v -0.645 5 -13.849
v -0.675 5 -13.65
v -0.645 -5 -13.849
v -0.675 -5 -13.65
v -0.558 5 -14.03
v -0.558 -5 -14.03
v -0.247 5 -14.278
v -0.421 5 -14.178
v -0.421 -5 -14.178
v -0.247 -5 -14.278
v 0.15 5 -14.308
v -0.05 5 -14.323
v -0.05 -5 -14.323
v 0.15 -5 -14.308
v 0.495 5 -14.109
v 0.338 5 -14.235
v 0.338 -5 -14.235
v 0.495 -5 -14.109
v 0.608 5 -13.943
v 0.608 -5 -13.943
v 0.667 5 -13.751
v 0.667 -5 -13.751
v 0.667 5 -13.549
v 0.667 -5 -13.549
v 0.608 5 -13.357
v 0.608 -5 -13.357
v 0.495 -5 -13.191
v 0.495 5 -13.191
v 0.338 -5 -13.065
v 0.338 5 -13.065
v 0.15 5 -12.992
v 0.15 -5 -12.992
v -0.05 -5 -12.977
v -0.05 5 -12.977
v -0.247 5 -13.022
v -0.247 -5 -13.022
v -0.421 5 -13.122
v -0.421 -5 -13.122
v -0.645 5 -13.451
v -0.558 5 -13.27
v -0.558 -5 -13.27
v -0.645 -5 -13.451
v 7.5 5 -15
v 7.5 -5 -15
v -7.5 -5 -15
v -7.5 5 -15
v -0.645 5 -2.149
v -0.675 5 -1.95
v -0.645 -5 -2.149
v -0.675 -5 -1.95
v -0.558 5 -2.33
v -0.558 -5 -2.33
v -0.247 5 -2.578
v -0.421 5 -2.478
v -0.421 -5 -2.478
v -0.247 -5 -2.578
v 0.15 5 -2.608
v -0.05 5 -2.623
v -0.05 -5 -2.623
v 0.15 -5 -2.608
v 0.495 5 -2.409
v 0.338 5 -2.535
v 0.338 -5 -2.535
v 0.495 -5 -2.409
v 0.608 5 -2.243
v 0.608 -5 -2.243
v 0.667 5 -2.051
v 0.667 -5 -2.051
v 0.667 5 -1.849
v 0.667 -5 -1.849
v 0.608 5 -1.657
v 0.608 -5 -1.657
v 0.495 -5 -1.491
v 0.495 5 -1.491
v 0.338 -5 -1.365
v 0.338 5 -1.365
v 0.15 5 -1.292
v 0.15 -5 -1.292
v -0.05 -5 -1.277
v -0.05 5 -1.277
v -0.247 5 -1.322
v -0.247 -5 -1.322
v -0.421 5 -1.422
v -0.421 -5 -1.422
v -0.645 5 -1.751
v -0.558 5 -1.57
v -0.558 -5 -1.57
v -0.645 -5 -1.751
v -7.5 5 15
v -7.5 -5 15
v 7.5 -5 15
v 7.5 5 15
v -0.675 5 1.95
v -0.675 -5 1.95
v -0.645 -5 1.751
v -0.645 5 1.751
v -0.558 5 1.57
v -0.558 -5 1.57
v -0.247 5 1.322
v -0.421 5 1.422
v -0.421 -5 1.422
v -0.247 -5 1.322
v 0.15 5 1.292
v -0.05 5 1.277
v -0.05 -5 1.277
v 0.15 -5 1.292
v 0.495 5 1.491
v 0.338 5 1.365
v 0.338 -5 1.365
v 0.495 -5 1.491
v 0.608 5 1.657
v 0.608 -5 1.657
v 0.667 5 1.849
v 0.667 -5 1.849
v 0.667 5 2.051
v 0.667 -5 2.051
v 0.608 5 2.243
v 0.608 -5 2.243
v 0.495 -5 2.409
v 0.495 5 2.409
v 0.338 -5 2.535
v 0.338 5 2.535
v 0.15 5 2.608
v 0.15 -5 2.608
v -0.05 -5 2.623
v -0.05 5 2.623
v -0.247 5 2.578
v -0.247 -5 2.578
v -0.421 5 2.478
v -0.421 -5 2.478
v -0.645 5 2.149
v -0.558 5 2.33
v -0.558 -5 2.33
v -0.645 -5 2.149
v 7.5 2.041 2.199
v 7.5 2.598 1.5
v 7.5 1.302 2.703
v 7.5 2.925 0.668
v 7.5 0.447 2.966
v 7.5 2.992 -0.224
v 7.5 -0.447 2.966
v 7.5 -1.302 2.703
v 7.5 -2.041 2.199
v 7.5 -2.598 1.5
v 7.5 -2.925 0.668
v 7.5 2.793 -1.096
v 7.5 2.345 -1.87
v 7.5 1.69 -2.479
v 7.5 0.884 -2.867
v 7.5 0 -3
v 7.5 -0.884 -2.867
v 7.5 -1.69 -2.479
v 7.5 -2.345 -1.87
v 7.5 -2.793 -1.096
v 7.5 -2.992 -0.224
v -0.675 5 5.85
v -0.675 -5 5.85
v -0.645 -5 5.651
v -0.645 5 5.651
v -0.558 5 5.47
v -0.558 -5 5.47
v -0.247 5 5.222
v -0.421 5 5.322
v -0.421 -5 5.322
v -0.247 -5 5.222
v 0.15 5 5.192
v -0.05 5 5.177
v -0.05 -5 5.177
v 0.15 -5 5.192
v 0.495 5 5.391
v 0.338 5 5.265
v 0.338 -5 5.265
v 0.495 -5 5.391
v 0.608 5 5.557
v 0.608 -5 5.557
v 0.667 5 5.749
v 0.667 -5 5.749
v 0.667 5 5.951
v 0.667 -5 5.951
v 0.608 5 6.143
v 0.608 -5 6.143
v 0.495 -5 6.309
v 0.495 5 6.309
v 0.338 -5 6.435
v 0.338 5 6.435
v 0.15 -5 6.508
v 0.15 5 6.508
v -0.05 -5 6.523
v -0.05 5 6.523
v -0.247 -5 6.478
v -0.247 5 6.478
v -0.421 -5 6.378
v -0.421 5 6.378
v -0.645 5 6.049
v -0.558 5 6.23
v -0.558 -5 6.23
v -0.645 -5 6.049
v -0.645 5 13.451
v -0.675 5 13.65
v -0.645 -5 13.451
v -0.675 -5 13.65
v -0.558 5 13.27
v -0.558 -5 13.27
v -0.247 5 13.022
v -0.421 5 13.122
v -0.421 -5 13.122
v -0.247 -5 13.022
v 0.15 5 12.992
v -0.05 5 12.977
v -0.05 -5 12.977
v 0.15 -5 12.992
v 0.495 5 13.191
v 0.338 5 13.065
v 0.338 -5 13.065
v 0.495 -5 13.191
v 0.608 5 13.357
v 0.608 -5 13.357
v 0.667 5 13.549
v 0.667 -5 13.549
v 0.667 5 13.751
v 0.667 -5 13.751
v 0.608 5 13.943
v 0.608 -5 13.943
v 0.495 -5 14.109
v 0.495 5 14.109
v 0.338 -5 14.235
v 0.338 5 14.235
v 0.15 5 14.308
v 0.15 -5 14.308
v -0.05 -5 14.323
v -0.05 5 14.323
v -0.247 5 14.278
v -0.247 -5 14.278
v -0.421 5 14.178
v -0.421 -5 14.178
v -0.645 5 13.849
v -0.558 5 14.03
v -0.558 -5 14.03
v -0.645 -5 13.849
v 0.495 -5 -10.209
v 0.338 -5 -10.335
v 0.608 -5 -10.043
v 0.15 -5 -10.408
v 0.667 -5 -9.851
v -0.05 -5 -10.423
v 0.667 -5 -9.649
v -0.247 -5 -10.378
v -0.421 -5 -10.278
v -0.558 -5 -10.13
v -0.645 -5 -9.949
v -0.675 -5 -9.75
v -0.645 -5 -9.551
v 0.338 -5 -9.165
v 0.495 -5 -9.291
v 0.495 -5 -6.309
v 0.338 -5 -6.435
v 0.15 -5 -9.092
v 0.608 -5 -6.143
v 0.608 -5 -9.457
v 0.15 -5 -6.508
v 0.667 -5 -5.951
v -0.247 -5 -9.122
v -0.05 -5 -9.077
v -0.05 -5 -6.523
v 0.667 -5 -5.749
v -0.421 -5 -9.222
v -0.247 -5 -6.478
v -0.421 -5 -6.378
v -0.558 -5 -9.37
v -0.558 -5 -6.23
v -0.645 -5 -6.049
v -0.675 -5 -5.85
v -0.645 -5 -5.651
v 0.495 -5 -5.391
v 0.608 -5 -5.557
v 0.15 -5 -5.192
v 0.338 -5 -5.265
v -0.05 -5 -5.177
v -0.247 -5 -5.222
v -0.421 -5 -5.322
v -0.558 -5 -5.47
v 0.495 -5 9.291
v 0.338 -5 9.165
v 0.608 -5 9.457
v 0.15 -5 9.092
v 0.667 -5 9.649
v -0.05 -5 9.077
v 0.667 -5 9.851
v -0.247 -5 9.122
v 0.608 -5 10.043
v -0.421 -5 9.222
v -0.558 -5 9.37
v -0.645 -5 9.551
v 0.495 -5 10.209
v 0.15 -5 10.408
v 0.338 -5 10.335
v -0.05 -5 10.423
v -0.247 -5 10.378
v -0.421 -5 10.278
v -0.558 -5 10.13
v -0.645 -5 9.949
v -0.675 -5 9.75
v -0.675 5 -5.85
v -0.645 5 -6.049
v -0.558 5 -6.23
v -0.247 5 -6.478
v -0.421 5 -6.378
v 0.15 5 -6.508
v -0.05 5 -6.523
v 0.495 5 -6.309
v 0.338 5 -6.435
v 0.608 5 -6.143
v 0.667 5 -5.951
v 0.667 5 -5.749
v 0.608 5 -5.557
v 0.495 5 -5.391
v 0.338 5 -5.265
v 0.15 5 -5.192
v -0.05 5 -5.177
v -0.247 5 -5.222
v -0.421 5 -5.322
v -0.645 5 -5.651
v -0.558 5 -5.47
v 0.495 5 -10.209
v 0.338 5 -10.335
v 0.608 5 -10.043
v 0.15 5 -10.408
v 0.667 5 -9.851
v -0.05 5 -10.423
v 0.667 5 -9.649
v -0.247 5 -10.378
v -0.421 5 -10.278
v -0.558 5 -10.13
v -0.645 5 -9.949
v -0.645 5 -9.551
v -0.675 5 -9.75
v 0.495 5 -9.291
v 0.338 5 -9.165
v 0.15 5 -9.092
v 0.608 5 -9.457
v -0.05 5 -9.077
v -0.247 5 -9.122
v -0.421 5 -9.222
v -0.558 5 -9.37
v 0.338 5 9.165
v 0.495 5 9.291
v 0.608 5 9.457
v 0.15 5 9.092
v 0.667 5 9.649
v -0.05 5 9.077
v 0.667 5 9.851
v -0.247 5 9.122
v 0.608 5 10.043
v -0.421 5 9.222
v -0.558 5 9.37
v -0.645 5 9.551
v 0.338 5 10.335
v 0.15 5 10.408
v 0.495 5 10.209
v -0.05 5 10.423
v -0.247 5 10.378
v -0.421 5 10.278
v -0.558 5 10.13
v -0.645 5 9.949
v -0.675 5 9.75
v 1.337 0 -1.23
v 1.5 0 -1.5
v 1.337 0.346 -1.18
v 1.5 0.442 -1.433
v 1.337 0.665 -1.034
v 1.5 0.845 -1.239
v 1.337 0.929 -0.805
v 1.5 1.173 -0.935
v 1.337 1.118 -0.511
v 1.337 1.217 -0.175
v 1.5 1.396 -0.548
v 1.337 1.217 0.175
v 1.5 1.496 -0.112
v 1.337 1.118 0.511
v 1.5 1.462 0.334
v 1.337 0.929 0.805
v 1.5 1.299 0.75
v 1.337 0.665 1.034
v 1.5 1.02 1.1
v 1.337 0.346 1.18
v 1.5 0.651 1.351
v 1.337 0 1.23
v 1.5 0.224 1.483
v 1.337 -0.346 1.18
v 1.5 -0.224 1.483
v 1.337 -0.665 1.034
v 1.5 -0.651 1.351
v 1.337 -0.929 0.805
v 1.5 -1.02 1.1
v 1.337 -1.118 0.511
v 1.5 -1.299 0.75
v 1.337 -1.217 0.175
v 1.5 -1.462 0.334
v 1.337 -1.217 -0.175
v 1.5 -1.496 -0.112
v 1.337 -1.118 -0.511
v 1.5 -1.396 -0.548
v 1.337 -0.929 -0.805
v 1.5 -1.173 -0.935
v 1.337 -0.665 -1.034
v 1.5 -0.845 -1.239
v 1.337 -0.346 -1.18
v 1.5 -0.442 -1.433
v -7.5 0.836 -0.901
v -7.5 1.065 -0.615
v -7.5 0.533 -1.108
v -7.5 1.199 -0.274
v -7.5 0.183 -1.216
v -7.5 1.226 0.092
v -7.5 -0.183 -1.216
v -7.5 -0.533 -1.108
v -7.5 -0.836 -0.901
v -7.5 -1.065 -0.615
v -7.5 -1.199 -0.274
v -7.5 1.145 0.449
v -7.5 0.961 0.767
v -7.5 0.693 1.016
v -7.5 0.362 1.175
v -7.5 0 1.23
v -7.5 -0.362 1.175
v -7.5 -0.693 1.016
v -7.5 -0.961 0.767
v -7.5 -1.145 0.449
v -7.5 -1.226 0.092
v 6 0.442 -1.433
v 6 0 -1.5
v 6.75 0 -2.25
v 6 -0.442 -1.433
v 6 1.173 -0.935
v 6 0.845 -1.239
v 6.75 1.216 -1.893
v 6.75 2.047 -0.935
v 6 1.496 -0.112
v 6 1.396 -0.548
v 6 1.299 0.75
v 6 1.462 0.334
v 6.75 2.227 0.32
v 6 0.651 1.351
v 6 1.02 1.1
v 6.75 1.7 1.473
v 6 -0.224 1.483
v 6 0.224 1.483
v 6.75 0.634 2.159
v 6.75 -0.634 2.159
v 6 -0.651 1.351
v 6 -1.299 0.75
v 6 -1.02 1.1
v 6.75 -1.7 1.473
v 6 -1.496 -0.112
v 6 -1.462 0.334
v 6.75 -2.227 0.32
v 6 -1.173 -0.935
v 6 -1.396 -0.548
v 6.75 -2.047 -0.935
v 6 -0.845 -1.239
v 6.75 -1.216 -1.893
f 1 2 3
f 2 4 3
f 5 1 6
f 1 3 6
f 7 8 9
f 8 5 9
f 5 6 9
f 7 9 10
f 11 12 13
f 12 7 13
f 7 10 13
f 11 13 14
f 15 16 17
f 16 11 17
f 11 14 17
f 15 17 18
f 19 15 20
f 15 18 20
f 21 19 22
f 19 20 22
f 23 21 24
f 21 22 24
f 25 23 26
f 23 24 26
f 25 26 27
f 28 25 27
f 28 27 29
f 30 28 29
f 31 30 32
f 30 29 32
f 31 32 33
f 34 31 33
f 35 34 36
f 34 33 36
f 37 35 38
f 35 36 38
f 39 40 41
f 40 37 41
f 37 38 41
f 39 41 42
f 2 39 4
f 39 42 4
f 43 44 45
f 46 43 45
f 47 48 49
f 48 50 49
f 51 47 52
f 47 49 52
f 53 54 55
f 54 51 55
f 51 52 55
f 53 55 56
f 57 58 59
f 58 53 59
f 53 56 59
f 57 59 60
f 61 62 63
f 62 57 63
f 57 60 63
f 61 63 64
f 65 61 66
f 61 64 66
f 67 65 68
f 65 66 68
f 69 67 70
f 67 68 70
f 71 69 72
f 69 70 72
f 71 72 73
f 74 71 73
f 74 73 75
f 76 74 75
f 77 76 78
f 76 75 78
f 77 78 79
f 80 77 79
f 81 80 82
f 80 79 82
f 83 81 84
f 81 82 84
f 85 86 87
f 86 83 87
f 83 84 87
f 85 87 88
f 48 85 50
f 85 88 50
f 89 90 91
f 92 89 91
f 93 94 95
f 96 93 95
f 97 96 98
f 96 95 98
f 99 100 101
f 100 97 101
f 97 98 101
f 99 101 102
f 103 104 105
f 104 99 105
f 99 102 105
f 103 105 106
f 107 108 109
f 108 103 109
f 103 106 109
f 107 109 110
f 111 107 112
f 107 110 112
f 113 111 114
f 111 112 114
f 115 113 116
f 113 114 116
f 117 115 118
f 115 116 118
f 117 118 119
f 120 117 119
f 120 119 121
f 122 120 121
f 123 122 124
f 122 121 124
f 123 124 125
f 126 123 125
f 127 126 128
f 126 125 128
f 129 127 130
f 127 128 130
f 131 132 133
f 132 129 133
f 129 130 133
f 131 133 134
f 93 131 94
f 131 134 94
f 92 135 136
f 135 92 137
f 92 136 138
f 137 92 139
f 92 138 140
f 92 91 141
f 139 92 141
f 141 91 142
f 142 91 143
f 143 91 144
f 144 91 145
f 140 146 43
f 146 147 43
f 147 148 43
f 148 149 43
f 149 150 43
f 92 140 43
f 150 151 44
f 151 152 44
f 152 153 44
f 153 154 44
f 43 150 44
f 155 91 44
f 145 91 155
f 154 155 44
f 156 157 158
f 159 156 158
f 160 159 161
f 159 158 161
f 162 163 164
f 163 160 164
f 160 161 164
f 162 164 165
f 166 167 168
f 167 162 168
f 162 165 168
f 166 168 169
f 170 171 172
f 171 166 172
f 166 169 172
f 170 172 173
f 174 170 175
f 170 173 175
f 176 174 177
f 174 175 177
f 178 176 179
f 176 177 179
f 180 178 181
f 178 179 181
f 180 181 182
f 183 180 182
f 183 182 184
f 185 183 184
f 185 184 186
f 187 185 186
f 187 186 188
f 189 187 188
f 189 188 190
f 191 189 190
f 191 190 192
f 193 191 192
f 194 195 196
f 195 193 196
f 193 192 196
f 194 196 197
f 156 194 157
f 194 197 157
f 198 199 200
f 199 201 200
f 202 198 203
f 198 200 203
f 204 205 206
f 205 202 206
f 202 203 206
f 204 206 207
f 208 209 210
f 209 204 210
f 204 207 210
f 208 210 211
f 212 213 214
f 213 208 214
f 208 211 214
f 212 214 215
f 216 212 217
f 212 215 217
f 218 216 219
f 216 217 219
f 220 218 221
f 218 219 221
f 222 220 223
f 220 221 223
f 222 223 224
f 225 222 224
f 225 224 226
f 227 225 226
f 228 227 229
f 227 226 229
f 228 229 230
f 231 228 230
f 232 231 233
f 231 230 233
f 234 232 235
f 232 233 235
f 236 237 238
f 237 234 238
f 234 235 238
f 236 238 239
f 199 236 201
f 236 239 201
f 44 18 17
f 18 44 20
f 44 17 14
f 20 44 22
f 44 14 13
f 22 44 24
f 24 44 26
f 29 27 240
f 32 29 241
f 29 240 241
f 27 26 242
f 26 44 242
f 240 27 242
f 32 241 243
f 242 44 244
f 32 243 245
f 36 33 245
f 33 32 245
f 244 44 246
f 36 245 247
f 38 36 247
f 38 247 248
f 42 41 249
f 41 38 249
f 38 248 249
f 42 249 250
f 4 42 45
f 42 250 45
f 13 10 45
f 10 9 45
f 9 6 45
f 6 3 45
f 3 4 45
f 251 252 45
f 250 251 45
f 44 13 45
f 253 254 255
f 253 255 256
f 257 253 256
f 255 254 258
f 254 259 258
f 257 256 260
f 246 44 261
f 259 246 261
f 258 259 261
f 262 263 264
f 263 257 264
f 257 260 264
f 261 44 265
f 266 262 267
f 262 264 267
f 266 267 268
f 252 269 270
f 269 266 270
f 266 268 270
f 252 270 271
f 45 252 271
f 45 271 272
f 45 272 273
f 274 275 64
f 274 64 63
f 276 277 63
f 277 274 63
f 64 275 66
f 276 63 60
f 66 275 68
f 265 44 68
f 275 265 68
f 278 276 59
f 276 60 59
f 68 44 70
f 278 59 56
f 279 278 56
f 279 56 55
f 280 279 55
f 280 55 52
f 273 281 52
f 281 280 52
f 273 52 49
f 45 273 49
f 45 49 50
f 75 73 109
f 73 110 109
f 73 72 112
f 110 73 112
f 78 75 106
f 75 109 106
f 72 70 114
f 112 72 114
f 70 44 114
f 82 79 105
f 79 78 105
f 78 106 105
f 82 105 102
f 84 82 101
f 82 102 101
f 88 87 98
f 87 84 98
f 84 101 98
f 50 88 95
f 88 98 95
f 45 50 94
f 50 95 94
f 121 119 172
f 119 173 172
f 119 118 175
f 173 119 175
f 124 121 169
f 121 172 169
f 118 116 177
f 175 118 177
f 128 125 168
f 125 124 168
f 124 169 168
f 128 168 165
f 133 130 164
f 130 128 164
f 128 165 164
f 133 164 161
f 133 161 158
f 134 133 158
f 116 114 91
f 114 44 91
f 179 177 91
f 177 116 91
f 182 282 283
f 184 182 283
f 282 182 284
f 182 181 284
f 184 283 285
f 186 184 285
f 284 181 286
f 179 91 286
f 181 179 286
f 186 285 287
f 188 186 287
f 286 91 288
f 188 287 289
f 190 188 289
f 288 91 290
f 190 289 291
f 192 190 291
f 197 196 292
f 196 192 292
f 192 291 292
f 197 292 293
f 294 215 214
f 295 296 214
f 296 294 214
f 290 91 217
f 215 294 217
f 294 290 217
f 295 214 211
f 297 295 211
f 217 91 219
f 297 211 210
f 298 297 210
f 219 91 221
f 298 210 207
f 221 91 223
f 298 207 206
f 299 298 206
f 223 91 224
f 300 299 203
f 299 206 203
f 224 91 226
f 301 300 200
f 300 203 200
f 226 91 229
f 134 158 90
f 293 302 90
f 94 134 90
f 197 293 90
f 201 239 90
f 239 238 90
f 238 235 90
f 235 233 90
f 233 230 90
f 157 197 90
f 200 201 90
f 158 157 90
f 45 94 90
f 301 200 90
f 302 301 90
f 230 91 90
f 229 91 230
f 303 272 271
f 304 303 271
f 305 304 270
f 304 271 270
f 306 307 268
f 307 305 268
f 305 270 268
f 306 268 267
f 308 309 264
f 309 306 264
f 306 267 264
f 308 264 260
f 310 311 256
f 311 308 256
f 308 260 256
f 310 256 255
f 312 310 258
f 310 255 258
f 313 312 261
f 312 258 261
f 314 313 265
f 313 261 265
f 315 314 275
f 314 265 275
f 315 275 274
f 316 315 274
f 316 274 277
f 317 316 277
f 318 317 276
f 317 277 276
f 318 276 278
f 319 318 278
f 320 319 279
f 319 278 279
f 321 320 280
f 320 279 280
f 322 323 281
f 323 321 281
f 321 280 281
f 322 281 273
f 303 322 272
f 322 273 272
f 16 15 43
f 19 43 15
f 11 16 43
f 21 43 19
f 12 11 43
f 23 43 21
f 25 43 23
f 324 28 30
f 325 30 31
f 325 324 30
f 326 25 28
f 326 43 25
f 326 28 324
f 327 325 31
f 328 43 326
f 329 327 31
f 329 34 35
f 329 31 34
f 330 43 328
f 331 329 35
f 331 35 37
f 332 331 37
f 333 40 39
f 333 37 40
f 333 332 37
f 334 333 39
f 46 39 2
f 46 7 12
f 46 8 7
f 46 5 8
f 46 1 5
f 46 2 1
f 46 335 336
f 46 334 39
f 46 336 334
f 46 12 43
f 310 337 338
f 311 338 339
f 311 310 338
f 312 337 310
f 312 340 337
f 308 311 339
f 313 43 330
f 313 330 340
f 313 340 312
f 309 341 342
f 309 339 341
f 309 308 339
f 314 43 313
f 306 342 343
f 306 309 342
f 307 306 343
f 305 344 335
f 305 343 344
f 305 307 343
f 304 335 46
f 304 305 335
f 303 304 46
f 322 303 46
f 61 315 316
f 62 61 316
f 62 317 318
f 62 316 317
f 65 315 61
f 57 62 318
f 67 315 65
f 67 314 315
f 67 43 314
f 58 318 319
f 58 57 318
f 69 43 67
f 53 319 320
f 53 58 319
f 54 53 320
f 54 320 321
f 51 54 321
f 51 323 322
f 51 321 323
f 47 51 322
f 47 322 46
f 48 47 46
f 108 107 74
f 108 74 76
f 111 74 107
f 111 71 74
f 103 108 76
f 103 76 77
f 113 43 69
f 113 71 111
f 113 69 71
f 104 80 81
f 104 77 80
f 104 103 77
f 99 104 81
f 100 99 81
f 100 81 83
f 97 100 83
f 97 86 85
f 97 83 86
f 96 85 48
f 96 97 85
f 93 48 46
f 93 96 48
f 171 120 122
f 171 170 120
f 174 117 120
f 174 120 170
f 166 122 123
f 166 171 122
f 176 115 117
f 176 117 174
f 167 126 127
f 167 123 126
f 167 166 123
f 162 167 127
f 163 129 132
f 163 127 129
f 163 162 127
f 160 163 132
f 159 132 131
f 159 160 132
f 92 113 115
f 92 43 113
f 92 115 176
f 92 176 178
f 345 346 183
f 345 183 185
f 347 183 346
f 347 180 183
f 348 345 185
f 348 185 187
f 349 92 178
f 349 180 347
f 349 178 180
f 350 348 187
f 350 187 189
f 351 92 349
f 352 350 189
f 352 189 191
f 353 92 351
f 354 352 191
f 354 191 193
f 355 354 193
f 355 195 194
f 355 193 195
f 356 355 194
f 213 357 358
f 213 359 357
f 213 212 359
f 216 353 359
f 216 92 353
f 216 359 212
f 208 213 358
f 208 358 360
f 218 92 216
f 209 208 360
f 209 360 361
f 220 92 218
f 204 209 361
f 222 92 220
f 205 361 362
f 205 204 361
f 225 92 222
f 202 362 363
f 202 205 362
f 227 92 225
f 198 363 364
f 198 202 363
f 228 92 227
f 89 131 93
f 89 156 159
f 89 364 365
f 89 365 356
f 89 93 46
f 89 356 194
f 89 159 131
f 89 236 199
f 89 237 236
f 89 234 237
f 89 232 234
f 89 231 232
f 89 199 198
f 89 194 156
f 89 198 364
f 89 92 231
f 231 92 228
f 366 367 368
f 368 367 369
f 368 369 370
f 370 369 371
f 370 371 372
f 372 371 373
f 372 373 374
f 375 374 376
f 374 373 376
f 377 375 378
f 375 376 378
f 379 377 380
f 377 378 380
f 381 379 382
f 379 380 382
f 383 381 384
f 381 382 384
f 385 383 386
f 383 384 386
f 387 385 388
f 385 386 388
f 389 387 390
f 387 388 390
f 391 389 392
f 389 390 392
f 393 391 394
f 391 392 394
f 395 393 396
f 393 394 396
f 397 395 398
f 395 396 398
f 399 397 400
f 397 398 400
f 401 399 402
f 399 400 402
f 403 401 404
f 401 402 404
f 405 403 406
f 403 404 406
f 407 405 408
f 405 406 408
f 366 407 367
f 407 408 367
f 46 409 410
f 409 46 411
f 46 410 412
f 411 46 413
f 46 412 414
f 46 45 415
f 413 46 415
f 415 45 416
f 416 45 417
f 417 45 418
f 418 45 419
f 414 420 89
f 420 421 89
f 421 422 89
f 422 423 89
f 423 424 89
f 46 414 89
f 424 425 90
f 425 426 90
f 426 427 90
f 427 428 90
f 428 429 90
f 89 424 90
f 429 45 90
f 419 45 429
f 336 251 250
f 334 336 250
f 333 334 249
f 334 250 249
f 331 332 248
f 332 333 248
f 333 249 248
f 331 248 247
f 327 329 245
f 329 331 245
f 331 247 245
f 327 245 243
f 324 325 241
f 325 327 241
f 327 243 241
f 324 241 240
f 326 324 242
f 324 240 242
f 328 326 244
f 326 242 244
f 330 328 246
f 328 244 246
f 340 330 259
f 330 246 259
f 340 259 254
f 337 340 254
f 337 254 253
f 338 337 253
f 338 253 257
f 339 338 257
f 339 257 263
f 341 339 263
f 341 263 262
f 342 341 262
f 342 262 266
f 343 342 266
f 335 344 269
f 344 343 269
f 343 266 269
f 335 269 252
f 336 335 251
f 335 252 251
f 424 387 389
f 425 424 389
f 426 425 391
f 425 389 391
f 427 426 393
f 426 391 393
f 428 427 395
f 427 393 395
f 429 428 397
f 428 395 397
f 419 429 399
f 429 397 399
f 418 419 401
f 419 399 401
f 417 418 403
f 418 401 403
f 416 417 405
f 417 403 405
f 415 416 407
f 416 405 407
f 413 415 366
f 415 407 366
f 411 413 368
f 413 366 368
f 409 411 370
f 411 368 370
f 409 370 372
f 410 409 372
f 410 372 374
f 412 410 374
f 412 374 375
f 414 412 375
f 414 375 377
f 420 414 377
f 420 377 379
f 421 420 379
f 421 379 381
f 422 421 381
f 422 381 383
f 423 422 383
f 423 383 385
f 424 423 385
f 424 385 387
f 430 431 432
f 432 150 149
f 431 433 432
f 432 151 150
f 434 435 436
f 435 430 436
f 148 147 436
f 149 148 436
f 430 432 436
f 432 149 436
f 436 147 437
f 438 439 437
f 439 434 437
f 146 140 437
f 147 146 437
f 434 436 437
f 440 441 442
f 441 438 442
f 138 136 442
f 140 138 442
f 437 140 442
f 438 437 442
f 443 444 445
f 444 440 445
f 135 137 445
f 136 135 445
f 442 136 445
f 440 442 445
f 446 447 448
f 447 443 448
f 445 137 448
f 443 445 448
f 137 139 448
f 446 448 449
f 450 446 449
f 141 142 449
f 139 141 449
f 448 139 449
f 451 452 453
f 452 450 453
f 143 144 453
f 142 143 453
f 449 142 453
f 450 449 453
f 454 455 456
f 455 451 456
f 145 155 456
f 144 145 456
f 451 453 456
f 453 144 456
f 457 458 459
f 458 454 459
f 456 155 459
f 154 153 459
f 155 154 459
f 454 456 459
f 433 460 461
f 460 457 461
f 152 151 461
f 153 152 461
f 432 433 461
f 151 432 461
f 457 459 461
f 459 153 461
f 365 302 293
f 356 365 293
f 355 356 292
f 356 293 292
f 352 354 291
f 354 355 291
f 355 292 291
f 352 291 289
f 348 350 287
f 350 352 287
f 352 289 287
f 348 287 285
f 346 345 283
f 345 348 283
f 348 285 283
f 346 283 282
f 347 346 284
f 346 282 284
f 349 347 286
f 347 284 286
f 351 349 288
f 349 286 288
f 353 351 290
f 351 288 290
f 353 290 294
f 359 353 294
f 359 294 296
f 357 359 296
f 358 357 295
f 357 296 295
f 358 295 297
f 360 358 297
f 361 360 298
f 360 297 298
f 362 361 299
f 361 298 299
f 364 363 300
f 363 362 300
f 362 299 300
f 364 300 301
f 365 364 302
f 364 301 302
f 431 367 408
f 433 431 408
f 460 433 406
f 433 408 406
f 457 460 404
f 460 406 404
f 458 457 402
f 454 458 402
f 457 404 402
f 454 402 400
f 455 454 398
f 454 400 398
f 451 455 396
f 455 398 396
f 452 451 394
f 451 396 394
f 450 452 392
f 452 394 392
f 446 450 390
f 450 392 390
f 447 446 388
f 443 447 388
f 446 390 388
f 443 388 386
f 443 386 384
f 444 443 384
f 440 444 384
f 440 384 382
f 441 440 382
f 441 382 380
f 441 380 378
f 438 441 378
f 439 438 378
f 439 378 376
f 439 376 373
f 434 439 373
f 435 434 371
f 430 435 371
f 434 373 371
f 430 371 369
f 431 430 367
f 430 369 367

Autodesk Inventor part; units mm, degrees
ref_plane "YZ Plane" through (0, 0, 0) normal (1, 0, 0) x (0, 1, 0)
ref_plane "XZ Plane" through (0, 0, 0) normal (0, 1, 0) x (-1, 0, 0)
ref_plane "XY Plane" through (0, 0, 0) normal (0, 0, 1) x (1, 0, 0)
sketch "Sketch1" plane through (0, 0, 0) normal (0, 1, 0) x (-1, 0, 0)
  line L0 (7.5, 15) -> (-7.5, 15)
  line L1 (-7.5, 15) -> (-7.5, -15)
  line L2 (-7.5, -15) -> (7.5, -15)
  line L3 (7.5, -15) -> (7.5, 15)
  circle A0 centre (0, 13.65) radius 0.675
  circle A1 centre (0, 9.75) radius 0.675
  circle A2 centre (0, 5.85) radius 0.675
  circle A3 centre (0, 1.95) radius 0.675
  circle A4 centre (0, -1.95) radius 0.675
  circle A5 centre (0, -5.85) radius 0.675
  circle A6 centre (0, -9.75) radius 0.675
  circle A7 centre (0, -13.65) radius 0.675
  point P0 (0, 0)
  point P1 (7.5, 0)
  point P2 (0, 15)
  dimension "d0" = 15
  dimension "d1" = 30
  dimension "d2" = 1.35
  dimension "d3" = 1.35
  dimension "d6" = 3.9
  dimension "d27" = 1.35
extrude "Cuerpo" add sketch "Sketch1" along normal mid plane 10
sketch "Sketch2" plane through (7.5, -5, -15) normal (1, 0, 0) x (0, 0, -1)
  point P0 (-15, 5)
  point P1 (-15, 5)
hole "BCAM3" at (7.5, 0, 0) direction (-1, 0, 0) diameter 3 depth 6 tip angle 118 countersink diameter 6 countersink angle 90
sketch "Sketch3" plane through (-7.5, -5, 15) normal (-1, 0, 0) x (0, 0, 1)
  circle A0 centre (-15, 5) radius 3 projected
hole "M3X0.6" at (-7.5, 0, 0) direction (1, 0, 0) diameter 2.459 end through all thread size "M3x0.5" class "6H" standard "ANSI Metric M Profile"
properties part number "Prensa FO"
